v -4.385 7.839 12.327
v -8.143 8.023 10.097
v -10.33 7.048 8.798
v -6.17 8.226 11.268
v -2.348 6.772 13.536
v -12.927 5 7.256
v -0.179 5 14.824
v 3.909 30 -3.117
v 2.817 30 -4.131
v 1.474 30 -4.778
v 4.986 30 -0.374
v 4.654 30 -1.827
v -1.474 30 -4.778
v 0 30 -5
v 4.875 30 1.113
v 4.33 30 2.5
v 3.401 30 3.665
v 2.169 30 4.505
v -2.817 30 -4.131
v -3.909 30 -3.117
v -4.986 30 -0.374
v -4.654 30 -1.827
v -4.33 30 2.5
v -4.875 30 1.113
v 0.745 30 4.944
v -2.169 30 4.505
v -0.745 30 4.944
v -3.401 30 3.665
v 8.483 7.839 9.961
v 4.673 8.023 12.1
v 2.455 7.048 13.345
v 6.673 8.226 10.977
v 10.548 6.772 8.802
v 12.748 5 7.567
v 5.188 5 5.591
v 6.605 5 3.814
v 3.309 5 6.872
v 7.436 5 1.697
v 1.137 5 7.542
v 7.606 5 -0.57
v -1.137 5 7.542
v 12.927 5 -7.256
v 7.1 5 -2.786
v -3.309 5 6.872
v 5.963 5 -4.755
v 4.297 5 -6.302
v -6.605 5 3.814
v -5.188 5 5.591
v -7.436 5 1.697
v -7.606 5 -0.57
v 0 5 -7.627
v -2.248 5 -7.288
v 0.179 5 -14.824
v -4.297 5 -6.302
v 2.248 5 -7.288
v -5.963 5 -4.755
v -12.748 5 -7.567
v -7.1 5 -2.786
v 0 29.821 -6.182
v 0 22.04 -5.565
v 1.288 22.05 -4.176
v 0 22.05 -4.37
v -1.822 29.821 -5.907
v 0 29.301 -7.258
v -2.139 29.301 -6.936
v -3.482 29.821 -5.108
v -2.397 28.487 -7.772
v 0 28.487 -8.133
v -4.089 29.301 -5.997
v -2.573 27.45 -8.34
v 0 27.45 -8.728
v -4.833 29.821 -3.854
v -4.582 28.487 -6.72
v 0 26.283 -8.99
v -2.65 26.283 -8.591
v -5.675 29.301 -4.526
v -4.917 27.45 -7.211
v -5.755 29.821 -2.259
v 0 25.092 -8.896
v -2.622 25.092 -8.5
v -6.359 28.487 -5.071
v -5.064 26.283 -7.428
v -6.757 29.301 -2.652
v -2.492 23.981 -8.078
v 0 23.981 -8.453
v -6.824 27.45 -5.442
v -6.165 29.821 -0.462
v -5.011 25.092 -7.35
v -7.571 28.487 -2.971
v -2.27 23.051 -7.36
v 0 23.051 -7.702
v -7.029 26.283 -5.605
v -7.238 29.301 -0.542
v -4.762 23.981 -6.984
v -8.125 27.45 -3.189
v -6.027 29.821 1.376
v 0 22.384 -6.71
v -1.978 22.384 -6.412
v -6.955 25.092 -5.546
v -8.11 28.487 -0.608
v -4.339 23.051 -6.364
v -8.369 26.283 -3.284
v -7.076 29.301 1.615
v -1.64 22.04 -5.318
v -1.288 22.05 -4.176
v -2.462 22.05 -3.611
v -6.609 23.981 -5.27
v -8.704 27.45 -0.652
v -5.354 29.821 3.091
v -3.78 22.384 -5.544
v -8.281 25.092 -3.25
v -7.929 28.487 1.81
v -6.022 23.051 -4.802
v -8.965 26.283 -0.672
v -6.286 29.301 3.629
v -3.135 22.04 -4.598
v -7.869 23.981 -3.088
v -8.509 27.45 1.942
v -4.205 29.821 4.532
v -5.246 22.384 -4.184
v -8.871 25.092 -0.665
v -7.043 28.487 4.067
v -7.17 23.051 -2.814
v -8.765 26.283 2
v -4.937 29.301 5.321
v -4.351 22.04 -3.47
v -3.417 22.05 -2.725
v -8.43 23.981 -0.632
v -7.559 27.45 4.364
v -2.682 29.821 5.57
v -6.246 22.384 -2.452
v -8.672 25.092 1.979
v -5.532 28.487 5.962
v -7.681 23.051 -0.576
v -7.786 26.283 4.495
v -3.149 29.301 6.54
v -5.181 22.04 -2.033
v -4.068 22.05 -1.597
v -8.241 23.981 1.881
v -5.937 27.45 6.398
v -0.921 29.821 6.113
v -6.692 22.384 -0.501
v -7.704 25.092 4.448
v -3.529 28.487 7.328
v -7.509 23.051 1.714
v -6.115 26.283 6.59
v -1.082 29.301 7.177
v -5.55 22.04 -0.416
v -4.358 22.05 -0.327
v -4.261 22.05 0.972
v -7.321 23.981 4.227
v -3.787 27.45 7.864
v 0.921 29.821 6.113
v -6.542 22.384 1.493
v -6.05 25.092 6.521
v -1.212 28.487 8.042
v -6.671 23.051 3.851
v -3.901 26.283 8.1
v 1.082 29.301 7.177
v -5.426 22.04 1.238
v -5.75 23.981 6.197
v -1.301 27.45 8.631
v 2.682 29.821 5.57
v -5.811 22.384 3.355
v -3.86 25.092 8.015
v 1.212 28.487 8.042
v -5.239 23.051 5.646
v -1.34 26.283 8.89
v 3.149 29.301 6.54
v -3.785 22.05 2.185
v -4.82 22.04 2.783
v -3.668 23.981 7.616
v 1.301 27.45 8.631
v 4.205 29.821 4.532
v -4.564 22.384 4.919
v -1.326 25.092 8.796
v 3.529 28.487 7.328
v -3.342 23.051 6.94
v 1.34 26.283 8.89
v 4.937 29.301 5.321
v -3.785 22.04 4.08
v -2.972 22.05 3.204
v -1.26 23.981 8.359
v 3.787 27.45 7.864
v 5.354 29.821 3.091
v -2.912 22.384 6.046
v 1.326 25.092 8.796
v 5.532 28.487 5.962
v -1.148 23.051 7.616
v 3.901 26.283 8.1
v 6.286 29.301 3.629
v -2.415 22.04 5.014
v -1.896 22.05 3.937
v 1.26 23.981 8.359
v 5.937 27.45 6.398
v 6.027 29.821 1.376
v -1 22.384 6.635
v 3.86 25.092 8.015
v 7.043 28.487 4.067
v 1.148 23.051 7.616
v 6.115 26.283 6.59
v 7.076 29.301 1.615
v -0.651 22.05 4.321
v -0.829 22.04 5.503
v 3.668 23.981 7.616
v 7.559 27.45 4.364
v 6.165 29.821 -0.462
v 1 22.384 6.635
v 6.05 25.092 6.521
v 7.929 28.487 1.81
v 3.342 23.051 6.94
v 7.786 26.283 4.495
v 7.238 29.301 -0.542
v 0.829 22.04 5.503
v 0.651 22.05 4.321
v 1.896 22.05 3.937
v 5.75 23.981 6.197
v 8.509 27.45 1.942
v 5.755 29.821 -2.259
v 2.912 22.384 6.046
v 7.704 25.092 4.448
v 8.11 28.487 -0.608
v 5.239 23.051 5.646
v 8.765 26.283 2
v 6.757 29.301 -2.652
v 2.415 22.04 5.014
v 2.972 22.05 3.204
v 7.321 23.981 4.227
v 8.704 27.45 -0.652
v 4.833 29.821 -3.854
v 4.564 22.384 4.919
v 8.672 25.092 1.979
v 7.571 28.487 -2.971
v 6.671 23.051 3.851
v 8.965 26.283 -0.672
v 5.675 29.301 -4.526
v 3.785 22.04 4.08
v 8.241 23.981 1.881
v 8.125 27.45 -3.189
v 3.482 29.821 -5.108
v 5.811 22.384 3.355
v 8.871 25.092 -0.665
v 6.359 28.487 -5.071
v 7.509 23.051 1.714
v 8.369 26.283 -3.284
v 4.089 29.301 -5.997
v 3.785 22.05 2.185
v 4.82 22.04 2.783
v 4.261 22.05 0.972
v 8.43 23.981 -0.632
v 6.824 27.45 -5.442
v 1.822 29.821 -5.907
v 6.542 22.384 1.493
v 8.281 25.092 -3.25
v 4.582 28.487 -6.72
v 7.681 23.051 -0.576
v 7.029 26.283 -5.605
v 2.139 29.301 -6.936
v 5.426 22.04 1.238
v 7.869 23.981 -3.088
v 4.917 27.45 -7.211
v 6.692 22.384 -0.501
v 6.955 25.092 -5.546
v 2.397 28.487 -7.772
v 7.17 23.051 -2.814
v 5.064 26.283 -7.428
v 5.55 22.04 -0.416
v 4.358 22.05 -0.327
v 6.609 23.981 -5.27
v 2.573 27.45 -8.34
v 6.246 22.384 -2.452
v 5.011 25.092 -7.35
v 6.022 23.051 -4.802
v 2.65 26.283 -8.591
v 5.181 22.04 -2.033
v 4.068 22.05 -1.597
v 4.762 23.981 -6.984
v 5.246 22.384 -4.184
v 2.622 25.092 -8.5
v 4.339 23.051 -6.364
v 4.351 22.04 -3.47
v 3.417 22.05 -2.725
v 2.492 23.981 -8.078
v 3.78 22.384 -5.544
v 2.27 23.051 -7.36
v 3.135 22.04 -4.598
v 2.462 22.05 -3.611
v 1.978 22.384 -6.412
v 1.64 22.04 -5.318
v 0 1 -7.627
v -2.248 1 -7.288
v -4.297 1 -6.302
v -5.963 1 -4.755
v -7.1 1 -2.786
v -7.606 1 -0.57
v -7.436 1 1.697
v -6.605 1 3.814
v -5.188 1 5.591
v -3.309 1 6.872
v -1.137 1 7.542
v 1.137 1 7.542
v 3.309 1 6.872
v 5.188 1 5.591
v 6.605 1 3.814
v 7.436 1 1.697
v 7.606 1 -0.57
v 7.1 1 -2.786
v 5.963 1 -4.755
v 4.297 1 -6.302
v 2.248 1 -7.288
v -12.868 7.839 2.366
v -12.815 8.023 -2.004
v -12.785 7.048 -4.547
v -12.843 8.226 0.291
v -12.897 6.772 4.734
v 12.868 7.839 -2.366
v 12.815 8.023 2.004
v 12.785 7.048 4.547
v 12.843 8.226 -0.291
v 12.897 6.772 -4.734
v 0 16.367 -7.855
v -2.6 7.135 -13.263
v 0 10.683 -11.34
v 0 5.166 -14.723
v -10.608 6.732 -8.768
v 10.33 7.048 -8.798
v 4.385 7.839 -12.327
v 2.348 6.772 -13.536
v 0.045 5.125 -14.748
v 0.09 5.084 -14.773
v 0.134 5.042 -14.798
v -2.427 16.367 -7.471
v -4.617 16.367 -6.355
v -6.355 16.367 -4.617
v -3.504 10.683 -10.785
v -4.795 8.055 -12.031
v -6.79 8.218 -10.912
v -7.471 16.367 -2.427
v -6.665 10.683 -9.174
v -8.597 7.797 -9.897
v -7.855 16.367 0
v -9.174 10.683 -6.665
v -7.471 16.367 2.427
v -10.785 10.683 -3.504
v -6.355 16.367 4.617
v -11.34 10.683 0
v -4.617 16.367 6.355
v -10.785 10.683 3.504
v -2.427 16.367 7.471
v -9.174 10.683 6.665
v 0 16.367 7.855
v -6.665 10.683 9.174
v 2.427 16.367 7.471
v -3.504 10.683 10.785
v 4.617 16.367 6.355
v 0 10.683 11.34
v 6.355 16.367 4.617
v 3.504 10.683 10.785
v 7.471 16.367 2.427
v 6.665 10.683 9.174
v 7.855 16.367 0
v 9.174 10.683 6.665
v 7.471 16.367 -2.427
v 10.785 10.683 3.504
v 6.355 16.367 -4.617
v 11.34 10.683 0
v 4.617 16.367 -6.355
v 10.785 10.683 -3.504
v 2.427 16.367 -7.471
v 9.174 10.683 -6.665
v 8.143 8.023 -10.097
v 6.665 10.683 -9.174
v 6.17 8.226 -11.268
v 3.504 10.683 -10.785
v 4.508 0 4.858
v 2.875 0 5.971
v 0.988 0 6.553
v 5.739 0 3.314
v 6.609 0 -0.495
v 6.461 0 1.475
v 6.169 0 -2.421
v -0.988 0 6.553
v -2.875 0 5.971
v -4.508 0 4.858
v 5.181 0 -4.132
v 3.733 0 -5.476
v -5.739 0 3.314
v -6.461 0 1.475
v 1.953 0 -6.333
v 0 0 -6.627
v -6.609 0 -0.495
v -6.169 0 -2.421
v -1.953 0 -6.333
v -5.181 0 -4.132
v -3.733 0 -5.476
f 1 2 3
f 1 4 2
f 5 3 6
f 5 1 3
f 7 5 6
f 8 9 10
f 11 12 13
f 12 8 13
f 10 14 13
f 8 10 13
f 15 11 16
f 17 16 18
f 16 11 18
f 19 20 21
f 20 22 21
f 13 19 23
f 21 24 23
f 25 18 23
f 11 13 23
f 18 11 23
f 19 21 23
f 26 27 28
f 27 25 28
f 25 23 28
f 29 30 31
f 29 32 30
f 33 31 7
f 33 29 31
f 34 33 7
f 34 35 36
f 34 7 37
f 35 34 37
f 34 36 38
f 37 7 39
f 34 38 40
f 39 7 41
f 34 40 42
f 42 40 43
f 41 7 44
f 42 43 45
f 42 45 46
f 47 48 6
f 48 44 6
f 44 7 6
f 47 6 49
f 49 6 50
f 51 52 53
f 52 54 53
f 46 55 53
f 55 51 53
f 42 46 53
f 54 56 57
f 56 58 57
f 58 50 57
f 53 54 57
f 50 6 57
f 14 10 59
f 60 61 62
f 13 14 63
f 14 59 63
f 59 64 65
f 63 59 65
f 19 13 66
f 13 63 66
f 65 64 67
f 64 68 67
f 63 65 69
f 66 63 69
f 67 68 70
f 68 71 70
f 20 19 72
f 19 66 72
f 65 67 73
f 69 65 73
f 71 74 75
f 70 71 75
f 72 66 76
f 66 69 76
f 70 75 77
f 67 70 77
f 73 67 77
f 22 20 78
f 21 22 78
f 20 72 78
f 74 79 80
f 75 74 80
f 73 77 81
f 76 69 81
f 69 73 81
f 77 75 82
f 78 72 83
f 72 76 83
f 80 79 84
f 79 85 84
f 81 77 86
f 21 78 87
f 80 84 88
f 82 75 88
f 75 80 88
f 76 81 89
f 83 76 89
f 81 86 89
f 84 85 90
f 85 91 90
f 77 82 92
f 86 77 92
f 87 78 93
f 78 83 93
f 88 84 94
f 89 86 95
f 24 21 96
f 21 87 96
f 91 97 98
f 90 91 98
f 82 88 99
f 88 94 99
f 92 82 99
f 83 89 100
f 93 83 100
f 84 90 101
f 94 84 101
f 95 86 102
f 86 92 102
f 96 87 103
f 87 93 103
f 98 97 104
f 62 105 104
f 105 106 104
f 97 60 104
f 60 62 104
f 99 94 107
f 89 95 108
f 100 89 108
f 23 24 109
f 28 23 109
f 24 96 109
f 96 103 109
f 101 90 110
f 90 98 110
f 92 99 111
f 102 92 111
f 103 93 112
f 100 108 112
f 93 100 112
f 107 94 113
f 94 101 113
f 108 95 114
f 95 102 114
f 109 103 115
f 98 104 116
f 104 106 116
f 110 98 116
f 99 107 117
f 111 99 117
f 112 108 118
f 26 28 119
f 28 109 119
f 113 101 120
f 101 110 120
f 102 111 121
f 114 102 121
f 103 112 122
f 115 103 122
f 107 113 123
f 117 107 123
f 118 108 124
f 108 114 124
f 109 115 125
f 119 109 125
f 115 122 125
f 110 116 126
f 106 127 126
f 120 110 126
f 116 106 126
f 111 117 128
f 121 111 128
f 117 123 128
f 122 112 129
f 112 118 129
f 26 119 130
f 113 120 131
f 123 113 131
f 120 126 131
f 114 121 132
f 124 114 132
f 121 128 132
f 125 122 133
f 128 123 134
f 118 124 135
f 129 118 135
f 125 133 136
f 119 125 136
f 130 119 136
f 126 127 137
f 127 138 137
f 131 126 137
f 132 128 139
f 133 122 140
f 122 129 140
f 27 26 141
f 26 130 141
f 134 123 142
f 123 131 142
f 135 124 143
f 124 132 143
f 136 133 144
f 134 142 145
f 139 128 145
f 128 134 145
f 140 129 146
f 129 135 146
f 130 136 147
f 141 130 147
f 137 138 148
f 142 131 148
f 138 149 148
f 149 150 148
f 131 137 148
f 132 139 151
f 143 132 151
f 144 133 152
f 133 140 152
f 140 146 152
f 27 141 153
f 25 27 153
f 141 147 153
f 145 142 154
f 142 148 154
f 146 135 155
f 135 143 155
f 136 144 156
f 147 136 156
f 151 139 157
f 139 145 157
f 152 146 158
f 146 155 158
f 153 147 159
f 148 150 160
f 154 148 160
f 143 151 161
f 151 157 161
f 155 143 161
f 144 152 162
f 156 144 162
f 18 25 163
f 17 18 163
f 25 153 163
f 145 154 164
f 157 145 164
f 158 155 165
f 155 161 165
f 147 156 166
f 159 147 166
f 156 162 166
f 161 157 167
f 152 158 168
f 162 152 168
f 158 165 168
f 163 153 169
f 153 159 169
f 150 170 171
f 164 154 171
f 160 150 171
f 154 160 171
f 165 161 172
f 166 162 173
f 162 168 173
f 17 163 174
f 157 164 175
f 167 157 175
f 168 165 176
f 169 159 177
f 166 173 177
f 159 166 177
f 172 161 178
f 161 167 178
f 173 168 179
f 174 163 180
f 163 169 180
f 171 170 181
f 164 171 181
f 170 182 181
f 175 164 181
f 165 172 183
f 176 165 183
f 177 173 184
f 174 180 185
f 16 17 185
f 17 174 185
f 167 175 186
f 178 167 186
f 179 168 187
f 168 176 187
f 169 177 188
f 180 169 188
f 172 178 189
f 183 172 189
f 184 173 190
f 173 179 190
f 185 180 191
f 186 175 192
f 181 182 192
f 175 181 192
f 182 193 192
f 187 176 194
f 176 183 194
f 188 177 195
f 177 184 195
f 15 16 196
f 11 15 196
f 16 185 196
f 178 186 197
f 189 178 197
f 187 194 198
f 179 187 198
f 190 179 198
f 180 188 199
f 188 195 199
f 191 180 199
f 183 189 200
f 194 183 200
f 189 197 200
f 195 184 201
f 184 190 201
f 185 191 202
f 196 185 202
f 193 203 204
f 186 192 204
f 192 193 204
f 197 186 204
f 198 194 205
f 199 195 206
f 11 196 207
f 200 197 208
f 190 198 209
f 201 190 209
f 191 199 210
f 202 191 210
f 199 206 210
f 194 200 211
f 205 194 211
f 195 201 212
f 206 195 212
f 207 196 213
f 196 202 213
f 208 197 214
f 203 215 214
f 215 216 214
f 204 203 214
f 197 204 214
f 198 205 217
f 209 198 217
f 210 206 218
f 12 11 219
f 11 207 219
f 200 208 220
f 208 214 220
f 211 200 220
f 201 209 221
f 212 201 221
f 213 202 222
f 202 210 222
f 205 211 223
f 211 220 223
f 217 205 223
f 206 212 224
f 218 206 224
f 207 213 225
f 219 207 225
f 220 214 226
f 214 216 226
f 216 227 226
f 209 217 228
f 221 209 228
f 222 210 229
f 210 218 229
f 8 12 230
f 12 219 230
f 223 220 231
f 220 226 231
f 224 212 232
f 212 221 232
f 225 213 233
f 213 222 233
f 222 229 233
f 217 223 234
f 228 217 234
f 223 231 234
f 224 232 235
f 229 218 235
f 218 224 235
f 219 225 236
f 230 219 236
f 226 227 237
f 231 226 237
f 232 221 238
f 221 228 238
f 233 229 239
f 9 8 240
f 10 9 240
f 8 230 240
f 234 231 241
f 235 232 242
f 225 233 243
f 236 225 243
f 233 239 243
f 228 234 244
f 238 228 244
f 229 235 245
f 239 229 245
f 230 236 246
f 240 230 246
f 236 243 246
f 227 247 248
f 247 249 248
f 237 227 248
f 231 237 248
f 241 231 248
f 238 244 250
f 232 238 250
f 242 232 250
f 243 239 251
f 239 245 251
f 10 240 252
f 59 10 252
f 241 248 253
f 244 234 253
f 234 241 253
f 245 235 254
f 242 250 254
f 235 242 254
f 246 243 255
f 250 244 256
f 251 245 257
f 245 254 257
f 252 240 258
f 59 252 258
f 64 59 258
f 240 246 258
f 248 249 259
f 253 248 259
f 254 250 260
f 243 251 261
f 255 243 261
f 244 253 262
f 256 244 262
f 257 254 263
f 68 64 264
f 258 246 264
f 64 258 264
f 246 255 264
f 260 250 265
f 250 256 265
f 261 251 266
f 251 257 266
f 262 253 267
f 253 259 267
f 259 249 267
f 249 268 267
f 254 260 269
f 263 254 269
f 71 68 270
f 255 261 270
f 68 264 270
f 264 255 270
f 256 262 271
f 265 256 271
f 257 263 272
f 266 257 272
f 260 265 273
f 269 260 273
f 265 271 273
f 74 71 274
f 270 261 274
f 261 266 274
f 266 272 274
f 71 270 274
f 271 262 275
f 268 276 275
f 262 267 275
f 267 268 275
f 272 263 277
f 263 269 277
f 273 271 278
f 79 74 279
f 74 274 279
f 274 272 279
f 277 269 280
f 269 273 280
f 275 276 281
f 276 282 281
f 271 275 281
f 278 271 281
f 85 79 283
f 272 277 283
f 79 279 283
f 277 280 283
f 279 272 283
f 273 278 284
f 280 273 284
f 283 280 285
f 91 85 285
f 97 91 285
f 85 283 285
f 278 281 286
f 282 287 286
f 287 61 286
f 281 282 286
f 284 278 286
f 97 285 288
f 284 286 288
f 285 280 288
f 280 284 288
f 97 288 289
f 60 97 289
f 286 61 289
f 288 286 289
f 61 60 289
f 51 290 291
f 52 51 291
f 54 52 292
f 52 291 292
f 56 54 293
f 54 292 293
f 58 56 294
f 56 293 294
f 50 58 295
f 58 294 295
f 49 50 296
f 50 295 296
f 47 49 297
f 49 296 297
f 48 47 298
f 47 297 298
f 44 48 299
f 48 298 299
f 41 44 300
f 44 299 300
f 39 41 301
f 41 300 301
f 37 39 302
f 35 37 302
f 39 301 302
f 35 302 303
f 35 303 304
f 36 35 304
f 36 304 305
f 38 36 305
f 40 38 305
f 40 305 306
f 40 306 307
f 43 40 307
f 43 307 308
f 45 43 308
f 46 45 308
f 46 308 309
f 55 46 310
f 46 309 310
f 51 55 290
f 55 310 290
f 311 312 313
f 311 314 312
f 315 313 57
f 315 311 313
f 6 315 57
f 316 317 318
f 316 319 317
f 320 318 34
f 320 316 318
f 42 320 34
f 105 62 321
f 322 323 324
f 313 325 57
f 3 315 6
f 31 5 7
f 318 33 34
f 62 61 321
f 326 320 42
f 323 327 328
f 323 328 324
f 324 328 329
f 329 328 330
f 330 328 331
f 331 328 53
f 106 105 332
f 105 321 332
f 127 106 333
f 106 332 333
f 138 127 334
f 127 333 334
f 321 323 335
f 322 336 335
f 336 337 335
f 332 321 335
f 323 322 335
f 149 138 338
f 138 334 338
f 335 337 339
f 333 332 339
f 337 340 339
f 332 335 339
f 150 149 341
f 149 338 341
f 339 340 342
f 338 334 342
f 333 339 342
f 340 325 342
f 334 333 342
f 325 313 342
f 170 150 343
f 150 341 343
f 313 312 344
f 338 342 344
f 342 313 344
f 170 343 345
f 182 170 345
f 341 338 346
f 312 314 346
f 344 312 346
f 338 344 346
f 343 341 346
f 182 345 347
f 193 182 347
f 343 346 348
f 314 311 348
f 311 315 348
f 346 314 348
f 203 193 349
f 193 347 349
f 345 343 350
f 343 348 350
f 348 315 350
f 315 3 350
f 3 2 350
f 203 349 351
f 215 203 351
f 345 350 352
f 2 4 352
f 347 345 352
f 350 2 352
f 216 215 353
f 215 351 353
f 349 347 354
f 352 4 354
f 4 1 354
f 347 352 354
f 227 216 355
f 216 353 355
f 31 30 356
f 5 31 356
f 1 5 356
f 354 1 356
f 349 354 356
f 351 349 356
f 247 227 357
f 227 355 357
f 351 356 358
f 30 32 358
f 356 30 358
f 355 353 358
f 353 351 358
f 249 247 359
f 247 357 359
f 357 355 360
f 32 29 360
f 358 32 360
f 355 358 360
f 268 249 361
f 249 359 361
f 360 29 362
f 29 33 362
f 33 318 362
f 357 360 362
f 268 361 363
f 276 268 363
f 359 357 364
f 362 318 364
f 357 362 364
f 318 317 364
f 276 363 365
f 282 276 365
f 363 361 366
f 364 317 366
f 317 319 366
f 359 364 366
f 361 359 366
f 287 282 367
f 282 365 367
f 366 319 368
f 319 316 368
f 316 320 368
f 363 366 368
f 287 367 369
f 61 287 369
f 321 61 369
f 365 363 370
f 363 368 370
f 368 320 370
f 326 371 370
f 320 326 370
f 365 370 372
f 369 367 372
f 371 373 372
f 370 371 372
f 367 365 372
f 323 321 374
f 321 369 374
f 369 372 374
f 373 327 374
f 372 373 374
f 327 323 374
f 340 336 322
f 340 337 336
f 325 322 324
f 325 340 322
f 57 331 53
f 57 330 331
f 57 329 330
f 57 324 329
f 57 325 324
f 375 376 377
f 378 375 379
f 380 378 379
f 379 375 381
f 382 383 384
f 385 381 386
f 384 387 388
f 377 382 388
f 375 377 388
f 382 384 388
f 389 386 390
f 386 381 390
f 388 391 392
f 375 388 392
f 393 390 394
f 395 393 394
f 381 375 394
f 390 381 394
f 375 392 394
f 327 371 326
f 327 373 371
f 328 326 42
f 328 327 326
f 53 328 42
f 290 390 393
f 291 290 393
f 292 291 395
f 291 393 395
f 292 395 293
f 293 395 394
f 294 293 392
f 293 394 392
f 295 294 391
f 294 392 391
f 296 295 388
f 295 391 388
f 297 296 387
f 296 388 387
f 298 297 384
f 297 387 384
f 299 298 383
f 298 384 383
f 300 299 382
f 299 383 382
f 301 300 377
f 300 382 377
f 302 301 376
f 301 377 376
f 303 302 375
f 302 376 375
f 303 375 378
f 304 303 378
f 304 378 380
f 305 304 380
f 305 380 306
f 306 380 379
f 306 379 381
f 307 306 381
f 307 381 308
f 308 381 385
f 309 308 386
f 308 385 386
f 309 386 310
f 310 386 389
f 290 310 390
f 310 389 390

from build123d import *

# Parameters (mm, degrees)
SKETCH2_OUTSIDE_W  = 41.962
SKETCH2_OUTSIDE_H  = 41.962
CUT_EXTRUDE1_DEPTH = 37.599869445
CHAMFER1_SIZE      = 1


with BuildPart() as part:
    # Sketch1 → Revolve1 (revolve)
    with BuildSketch(Plane.XY, mode=Mode.PRIVATE) as revolve1_sk:
        with BuildLine():
            Line((0, 30), (-5, 30))
            ThreePointArc((-5, 30), (-8.987504197, 25.684072353), (-4.370118592, 22.049905139))
            Line((-4.370118592, 22.049905139), (-14.824817763, 5))
            Line((-14.824817763, 5), (-7.627118644, 5))
            Line((-7.627118644, 5), (-7.627118644, 0))
            Line((-7.627118644, 0), (0, 0))
            Line((0, 0), (0, 30))
        make_face()
    revolve(revolve1_sk.sketch.rotate(Axis((0, 0, 0), (0, 1, 0)), 270), axis=Axis((0, 0, 0), (0, 1, 0)))

    # Sketch2 outside → Cut-Extrude1 (cut, through all)
    with BuildSketch(Plane(origin=(0, 30, 0), x_dir=(1, 0, 0), z_dir=(0, 1, 0))):
        Rectangle(SKETCH2_OUTSIDE_W, SKETCH2_OUTSIDE_H)
        Polygon((-12.927457346, -7.256450114), (-0.179458533, -14.823731525), (12.747998813, -7.567281411), (12.927457346, 7.256450114), (0.179458533, 14.823731525), (-12.747998813, 7.567281411), align=None, mode=Mode.SUBTRACT)
    extrude(amount=-CUT_EXTRUDE1_DEPTH, mode=Mode.SUBTRACT)

    # Chamfer1
    chamfer1_edges = [part.edges().sort_by_distance(p)[0] for p in [
        (0, 0, 7.627118644),
    ]]
    chamfer(chamfer1_edges, length=CHAMFER1_SIZE)


solid = part.part
